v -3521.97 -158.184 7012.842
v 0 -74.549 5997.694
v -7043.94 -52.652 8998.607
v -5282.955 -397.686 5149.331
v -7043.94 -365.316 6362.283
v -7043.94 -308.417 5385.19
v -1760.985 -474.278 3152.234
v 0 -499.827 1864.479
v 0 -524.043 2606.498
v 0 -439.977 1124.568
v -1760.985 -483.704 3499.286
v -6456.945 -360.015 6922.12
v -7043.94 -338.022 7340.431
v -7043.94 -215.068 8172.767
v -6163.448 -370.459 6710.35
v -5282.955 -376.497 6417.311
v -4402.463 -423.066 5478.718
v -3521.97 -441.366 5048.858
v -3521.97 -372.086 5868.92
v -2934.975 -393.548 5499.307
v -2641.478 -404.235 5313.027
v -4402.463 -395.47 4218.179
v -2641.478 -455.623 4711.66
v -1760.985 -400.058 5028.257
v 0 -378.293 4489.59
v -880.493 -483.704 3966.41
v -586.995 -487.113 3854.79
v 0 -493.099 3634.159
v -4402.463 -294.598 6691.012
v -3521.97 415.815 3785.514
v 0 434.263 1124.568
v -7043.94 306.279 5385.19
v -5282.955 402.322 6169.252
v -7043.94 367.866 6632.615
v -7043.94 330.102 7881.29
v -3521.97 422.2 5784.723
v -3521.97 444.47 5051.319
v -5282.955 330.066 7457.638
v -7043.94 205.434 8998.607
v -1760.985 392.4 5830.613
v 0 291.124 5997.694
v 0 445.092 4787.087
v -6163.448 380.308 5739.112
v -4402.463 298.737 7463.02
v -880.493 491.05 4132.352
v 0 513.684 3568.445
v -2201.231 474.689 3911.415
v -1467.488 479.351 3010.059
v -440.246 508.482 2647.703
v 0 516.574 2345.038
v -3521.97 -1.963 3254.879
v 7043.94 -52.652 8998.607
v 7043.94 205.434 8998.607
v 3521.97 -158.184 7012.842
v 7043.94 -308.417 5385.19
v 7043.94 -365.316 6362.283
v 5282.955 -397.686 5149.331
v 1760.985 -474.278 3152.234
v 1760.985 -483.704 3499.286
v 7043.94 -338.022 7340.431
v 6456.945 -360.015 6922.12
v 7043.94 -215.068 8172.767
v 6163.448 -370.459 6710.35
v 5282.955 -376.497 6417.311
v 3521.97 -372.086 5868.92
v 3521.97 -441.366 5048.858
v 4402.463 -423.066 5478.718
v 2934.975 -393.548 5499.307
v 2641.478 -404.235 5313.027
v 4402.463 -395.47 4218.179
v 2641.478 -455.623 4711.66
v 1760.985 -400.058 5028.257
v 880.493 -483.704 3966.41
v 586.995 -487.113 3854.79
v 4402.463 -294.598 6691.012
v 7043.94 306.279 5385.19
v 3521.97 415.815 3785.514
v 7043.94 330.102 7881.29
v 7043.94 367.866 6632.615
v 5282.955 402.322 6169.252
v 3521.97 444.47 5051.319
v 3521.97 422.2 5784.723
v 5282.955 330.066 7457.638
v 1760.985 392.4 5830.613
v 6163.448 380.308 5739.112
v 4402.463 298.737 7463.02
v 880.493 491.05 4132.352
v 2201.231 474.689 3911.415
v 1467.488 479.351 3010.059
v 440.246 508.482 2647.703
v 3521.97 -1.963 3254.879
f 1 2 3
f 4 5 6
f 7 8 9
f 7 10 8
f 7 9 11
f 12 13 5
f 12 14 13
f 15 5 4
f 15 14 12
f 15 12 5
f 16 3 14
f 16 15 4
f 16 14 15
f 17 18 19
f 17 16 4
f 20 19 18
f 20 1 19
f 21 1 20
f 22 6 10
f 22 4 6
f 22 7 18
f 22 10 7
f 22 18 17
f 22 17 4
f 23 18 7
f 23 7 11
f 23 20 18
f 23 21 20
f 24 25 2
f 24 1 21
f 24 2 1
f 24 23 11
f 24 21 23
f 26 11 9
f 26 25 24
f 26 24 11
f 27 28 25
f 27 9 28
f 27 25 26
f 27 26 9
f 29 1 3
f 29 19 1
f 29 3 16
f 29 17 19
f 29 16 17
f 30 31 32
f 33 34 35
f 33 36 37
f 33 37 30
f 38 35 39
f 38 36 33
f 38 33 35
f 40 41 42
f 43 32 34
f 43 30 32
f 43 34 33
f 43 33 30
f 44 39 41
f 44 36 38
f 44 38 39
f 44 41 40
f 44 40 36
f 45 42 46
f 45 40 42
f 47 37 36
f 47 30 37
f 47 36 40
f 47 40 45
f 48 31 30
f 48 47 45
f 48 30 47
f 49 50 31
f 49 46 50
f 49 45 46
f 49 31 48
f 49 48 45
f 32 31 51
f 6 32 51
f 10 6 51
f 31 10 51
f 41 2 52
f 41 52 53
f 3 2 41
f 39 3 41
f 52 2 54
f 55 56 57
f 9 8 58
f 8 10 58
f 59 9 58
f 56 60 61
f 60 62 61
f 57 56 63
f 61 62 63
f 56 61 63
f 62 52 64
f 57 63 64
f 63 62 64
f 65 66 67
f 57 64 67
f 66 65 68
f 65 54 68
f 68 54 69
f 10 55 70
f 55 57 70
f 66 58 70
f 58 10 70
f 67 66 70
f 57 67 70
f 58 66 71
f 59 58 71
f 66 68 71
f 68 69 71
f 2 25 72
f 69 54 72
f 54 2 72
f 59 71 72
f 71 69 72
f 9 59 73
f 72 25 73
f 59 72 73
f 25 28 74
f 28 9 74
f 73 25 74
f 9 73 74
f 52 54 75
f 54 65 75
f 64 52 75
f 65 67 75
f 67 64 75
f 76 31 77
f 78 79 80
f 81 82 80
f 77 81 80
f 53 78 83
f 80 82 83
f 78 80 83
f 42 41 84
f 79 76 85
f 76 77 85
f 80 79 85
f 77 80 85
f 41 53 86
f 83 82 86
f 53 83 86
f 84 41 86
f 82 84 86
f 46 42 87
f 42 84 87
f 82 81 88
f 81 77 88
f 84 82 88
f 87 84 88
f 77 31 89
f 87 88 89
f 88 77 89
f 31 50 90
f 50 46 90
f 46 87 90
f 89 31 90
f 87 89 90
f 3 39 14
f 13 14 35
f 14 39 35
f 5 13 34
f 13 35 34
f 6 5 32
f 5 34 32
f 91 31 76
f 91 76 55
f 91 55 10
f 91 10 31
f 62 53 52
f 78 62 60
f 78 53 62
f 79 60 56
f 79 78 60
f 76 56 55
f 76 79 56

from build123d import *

# Parameters (mm, degrees)
SKETCH4_W          = 217940.907579301
SKETCH4_H          = 93089.135284755
CUT_EXTRUDE1_DEPTH = 10668


with BuildPart() as part:
    # Surface-Knit3: read off the stored shape, not the designer's step
    # Surface-Knit3: loft between two sections, ruled curve by curve
    surface_knit3_from = [
        Edge.make_bspline([(-17711.940475464, -19.490699903, 13543.468166774), (-17711.940475464, -24.803354412, 13505.175719997), (-17711.940475464, -31.396398644, 13464.275981289), (-17711.940475464, -45.430309453, 13381.499157648), (-17711.940475464, -53.344980689, 13336.898353131), (-17711.940475464, -61.065145115, 13290.715817609), (-17711.940475464, -61.767456376, 13286.482697487), (-17711.940475464, -74.289101345, 13210.432056947), (-17711.940475464, -88.890712357, 13108.577006997), (-17711.940475464, -105.610298479, 12959.75813616), (-17711.940475464, -112.428540164, 12883.087596559), (-17711.940475464, -116.055888825, 12834.310114395), (-17711.940475464, -116.205326244, 12832.283421892), (-17711.940475464, -117.058739578, 12820.609367392), (-17711.940475464, -119.658021556, 12783.51276946), (-17711.940475464, -121.828248889, 12746.387473568), (-17711.940475464, -123.322481099, 12716.487057512), (-17711.940475464, -123.44163031, 12714.066644402), (-17711.940475464, -124.475503171, 12692.741231146), (-17711.940475464, -127.196746164, 12629.236726941), (-17711.940475464, -129.548016398, 12535.864319025), (-17711.940475464, -130.304711397, 12439.619928677), (-17711.940475464, -130.109672374, 12364.04802458), (-17711.940475464, -129.476326154, 12305.581144117), (-17711.940475464, -128.678113837, 12256.578612915), (-17711.940475464, -128.009923672, 12223.262795348), (-17711.940475464, -126.248907992, 12147.312787219), (-17711.940475464, -123.889055703, 12075.673268649), (-17711.940475464, -118.082459732, 11956.797831257), (-17711.940475464, -113.908002015, 11893.293757756), (-17711.940475464, -109.171078797, 11837.87389869)], [0, 0, 0, 0, 0.067690989, 0.072531875, 0.147004708, 0.147004708, 0.154518059, 0.154518059, 0.281959224, 0.334640627, 0.416725924, 0.416725924, 0.420284224, 0.420284224, 0.437221308, 0.48539803, 0.48539803, 0.489641218, 0.489641218, 0.522781927, 0.600939606, 0.653181658, 0.691298481, 0.733256996, 0.755561096, 0.77711214, 0.791603663, 0.888581753, 0.90260804, 1, 1, 1, 1], 3),
        Edge.make_bspline([(-17711.940475464, 112.448931944, 11837.87389869), (-17711.940475464, 115.858623311, 11876.338812234), (-17711.940475464, 119.415570244, 11927.264227177), (-17711.940475464, 123.439039127, 12006.164344249), (-17711.940475464, 126.024443681, 12074.694250467), (-17711.940475464, 127.814670989, 12148.130460545), (-17711.940475464, 128.620158562, 12193.612696901), (-17711.940475464, 129.010009381, 12217.930434419), (-17711.940475464, 129.634702387, 12258.081209211), (-17711.940475464, 130.777298991, 12347.600723561), (-17711.940475464, 131.775175378, 12509.868286874), (-17711.940475464, 130.969991963, 12638.99775061), (-17711.940475464, 129.666612166, 12720.880166331), (-17711.940475464, 129.632145327, 12723.011755151), (-17711.940475464, 129.286288491, 12744.069077122), (-17711.940475464, 127.995287538, 12813.148852153), (-17711.940475464, 124.557578721, 12936.558220654), (-17711.940475464, 119.12436106, 13056.338653937), (-17711.940475464, 113.682828529, 13147.513676307), (-17711.940475464, 109.467908518, 13209.729334806), (-17711.940475464, 103.8074791, 13281.534144751), (-17711.940475464, 93.543673458, 13394.159236979), (-17711.940475464, 83.671904107, 13481.322428275), (-17711.940475464, 75.655371215, 13543.468166774)], [0, 0, 0, 0, 0.067814661, 0.089638719, 0.13874429, 0.188246154, 0.218631058, 0.218631058, 0.230957041, 0.28914984, 0.375849943, 0.515921358, 0.515921358, 0.51966521, 0.51966521, 0.552905828, 0.640997482, 0.736461444, 0.763471366, 0.801398092, 0.845969427, 0.889959067, 1, 1, 1, 1], 3),
        Edge.make_line((-17711.940475464, 112.448931944, 11837.87389869), (-17711.940475464, -109.171078797, 11837.87389869)),
        Edge.make_line((-17711.940475464, -19.490699903, 13543.468166774), (-17711.940475464, 75.655371215, 13543.468166774)),
    ]
    surface_knit3_to = [
        Edge.make_bspline([(0, -74.548641103, 5997.694129526), (0, -92.876282917, 5888.310530003), (0, -115.317624049, 5771.595151029), (0, -163.798425653, 5535.659462367), (0, -191.59351315, 5408.710607244), (0, -220.056131458, 5277.429461693), (0, -222.662006122, 5265.398131874), (0, -269.392803808, 5049.276216929), (0, -329.911738534, 4760.387282384), (0, -405.848449007, 4337.516095938), (0, -438.816531993, 4119.141691796), (0, -456.592188962, 3979.949168518), (0, -457.324975774, 3974.165294689), (0, -461.51218458, 3940.846665333), (0, -474.307517862, 3834.929725853), (0, -485.034945558, 3728.772873873), (0, -492.343356759, 3643.196769546), (0, -492.926050751, 3636.268950917), (0, -497.982080071, 3575.226095309), (0, -511.228074838, 3393.340242893), (0, -522.365169387, 3125.569501148), (0, -525.773660709, 2849.468387191), (0, -524.779729774, 2632.675151842), (0, -521.849519313, 2464.95193659), (0, -518.202891169, 2324.394832709), (0, -515.235966946, 2228.843084541), (0, -507.606732796, 2011.025148153), (0, -497.680115772, 1805.623465244), (0, -474.418469864, 1464.962942411), (0, -458.150939984, 1283.101429313), (0, -439.977097141, 1124.567649286)], [0, 0, 0, 0, 0.067690989, 0.072531875, 0.147004708, 0.147004708, 0.154518059, 0.154518059, 0.281959224, 0.334640627, 0.416725924, 0.416725924, 0.420284224, 0.420284224, 0.437221308, 0.48539803, 0.48539803, 0.489641218, 0.489641218, 0.522781927, 0.600939606, 0.653181658, 0.691298481, 0.733256996, 0.755561096, 0.77711214, 0.791603663, 0.888581753, 0.90260804, 1, 1, 1, 1], 3),
        Edge.make_bspline([(0, 434.262669848, 1124.567649286), (0, 446.63171021, 1234.380292573), (0, 460.901570919, 1379.76275731), (0, 479.302580522, 1605.106484751), (0, 492.86883129, 1800.892196295), (0, 504.130561325, 2010.793749301), (0, 509.576661856, 2140.860632533), (0, 512.191507249, 2210.411125812), (0, 516.309968607, 2325.251531297), (0, 523.004020017, 2581.367191943), (0, 526.287976268, 3045.74530127), (0, 518.900370536, 3415.250165612), (0, 511.093601322, 3649.473857333), (0, 510.888200599, 3655.57117725), (0, 508.837793347, 3715.804121181), (0, 501.513216951, 3913.385403224), (0, 484.408696997, 4266.265945864), (0, 460.582530206, 4608.592017012), (0, 438.044605503, 4868.997518035), (0, 420.995286093, 5046.632306258), (0, 398.709430134, 5251.546638341), (0, 359.043008571, 5572.752594931), (0, 321.645333025, 5820.993968722), (0, 291.124383689, 5997.694129526)], [0, 0, 0, 0, 0.067814661, 0.089638719, 0.13874429, 0.188246154, 0.218631058, 0.218631058, 0.230957041, 0.28914984, 0.375849943, 0.515921358, 0.515921358, 0.51966521, 0.51966521, 0.552905828, 0.640997482, 0.736461444, 0.763471366, 0.801398092, 0.845969427, 0.889959067, 1, 1, 1, 1], 3),
        Edge.make_line((0, 434.262669848, 1124.567649286), (0, -439.977097141, 1124.567649286)),
        Edge.make_line((0, -74.548641103, 5997.694129526), (0, 291.124383689, 5997.694129526)),
    ]
    surface_knit3 = Solid(Shell([*[Face.make_surface_from_curves(surface_knit3_from[k], surface_knit3_to[k]) for k in range(4)], Face(Wire(surface_knit3_from)), Face(Wire(surface_knit3_to))]))
    add(surface_knit3)

    # Sketch4 → Cut-Extrude1 (cut)
    with BuildSketch(Plane(origin=(-17711.940475464, 0, 0), x_dir=(0, 0, -1), z_dir=(1, 0, 0))):
        with Locations((-12391.117982578, -2547.446341343)):
            Rectangle(SKETCH4_W, SKETCH4_H)
    extrude(amount=CUT_EXTRUDE1_DEPTH, mode=Mode.SUBTRACT)

    # Mirror1: part across plane


with BuildPart() as part_1:
    add(part.part)
    add(part.part.mirror(Plane(origin=(0, 0, 0), x_dir=(0, 0, 1), z_dir=(1, 0, 0))))


solid = part_1.part
